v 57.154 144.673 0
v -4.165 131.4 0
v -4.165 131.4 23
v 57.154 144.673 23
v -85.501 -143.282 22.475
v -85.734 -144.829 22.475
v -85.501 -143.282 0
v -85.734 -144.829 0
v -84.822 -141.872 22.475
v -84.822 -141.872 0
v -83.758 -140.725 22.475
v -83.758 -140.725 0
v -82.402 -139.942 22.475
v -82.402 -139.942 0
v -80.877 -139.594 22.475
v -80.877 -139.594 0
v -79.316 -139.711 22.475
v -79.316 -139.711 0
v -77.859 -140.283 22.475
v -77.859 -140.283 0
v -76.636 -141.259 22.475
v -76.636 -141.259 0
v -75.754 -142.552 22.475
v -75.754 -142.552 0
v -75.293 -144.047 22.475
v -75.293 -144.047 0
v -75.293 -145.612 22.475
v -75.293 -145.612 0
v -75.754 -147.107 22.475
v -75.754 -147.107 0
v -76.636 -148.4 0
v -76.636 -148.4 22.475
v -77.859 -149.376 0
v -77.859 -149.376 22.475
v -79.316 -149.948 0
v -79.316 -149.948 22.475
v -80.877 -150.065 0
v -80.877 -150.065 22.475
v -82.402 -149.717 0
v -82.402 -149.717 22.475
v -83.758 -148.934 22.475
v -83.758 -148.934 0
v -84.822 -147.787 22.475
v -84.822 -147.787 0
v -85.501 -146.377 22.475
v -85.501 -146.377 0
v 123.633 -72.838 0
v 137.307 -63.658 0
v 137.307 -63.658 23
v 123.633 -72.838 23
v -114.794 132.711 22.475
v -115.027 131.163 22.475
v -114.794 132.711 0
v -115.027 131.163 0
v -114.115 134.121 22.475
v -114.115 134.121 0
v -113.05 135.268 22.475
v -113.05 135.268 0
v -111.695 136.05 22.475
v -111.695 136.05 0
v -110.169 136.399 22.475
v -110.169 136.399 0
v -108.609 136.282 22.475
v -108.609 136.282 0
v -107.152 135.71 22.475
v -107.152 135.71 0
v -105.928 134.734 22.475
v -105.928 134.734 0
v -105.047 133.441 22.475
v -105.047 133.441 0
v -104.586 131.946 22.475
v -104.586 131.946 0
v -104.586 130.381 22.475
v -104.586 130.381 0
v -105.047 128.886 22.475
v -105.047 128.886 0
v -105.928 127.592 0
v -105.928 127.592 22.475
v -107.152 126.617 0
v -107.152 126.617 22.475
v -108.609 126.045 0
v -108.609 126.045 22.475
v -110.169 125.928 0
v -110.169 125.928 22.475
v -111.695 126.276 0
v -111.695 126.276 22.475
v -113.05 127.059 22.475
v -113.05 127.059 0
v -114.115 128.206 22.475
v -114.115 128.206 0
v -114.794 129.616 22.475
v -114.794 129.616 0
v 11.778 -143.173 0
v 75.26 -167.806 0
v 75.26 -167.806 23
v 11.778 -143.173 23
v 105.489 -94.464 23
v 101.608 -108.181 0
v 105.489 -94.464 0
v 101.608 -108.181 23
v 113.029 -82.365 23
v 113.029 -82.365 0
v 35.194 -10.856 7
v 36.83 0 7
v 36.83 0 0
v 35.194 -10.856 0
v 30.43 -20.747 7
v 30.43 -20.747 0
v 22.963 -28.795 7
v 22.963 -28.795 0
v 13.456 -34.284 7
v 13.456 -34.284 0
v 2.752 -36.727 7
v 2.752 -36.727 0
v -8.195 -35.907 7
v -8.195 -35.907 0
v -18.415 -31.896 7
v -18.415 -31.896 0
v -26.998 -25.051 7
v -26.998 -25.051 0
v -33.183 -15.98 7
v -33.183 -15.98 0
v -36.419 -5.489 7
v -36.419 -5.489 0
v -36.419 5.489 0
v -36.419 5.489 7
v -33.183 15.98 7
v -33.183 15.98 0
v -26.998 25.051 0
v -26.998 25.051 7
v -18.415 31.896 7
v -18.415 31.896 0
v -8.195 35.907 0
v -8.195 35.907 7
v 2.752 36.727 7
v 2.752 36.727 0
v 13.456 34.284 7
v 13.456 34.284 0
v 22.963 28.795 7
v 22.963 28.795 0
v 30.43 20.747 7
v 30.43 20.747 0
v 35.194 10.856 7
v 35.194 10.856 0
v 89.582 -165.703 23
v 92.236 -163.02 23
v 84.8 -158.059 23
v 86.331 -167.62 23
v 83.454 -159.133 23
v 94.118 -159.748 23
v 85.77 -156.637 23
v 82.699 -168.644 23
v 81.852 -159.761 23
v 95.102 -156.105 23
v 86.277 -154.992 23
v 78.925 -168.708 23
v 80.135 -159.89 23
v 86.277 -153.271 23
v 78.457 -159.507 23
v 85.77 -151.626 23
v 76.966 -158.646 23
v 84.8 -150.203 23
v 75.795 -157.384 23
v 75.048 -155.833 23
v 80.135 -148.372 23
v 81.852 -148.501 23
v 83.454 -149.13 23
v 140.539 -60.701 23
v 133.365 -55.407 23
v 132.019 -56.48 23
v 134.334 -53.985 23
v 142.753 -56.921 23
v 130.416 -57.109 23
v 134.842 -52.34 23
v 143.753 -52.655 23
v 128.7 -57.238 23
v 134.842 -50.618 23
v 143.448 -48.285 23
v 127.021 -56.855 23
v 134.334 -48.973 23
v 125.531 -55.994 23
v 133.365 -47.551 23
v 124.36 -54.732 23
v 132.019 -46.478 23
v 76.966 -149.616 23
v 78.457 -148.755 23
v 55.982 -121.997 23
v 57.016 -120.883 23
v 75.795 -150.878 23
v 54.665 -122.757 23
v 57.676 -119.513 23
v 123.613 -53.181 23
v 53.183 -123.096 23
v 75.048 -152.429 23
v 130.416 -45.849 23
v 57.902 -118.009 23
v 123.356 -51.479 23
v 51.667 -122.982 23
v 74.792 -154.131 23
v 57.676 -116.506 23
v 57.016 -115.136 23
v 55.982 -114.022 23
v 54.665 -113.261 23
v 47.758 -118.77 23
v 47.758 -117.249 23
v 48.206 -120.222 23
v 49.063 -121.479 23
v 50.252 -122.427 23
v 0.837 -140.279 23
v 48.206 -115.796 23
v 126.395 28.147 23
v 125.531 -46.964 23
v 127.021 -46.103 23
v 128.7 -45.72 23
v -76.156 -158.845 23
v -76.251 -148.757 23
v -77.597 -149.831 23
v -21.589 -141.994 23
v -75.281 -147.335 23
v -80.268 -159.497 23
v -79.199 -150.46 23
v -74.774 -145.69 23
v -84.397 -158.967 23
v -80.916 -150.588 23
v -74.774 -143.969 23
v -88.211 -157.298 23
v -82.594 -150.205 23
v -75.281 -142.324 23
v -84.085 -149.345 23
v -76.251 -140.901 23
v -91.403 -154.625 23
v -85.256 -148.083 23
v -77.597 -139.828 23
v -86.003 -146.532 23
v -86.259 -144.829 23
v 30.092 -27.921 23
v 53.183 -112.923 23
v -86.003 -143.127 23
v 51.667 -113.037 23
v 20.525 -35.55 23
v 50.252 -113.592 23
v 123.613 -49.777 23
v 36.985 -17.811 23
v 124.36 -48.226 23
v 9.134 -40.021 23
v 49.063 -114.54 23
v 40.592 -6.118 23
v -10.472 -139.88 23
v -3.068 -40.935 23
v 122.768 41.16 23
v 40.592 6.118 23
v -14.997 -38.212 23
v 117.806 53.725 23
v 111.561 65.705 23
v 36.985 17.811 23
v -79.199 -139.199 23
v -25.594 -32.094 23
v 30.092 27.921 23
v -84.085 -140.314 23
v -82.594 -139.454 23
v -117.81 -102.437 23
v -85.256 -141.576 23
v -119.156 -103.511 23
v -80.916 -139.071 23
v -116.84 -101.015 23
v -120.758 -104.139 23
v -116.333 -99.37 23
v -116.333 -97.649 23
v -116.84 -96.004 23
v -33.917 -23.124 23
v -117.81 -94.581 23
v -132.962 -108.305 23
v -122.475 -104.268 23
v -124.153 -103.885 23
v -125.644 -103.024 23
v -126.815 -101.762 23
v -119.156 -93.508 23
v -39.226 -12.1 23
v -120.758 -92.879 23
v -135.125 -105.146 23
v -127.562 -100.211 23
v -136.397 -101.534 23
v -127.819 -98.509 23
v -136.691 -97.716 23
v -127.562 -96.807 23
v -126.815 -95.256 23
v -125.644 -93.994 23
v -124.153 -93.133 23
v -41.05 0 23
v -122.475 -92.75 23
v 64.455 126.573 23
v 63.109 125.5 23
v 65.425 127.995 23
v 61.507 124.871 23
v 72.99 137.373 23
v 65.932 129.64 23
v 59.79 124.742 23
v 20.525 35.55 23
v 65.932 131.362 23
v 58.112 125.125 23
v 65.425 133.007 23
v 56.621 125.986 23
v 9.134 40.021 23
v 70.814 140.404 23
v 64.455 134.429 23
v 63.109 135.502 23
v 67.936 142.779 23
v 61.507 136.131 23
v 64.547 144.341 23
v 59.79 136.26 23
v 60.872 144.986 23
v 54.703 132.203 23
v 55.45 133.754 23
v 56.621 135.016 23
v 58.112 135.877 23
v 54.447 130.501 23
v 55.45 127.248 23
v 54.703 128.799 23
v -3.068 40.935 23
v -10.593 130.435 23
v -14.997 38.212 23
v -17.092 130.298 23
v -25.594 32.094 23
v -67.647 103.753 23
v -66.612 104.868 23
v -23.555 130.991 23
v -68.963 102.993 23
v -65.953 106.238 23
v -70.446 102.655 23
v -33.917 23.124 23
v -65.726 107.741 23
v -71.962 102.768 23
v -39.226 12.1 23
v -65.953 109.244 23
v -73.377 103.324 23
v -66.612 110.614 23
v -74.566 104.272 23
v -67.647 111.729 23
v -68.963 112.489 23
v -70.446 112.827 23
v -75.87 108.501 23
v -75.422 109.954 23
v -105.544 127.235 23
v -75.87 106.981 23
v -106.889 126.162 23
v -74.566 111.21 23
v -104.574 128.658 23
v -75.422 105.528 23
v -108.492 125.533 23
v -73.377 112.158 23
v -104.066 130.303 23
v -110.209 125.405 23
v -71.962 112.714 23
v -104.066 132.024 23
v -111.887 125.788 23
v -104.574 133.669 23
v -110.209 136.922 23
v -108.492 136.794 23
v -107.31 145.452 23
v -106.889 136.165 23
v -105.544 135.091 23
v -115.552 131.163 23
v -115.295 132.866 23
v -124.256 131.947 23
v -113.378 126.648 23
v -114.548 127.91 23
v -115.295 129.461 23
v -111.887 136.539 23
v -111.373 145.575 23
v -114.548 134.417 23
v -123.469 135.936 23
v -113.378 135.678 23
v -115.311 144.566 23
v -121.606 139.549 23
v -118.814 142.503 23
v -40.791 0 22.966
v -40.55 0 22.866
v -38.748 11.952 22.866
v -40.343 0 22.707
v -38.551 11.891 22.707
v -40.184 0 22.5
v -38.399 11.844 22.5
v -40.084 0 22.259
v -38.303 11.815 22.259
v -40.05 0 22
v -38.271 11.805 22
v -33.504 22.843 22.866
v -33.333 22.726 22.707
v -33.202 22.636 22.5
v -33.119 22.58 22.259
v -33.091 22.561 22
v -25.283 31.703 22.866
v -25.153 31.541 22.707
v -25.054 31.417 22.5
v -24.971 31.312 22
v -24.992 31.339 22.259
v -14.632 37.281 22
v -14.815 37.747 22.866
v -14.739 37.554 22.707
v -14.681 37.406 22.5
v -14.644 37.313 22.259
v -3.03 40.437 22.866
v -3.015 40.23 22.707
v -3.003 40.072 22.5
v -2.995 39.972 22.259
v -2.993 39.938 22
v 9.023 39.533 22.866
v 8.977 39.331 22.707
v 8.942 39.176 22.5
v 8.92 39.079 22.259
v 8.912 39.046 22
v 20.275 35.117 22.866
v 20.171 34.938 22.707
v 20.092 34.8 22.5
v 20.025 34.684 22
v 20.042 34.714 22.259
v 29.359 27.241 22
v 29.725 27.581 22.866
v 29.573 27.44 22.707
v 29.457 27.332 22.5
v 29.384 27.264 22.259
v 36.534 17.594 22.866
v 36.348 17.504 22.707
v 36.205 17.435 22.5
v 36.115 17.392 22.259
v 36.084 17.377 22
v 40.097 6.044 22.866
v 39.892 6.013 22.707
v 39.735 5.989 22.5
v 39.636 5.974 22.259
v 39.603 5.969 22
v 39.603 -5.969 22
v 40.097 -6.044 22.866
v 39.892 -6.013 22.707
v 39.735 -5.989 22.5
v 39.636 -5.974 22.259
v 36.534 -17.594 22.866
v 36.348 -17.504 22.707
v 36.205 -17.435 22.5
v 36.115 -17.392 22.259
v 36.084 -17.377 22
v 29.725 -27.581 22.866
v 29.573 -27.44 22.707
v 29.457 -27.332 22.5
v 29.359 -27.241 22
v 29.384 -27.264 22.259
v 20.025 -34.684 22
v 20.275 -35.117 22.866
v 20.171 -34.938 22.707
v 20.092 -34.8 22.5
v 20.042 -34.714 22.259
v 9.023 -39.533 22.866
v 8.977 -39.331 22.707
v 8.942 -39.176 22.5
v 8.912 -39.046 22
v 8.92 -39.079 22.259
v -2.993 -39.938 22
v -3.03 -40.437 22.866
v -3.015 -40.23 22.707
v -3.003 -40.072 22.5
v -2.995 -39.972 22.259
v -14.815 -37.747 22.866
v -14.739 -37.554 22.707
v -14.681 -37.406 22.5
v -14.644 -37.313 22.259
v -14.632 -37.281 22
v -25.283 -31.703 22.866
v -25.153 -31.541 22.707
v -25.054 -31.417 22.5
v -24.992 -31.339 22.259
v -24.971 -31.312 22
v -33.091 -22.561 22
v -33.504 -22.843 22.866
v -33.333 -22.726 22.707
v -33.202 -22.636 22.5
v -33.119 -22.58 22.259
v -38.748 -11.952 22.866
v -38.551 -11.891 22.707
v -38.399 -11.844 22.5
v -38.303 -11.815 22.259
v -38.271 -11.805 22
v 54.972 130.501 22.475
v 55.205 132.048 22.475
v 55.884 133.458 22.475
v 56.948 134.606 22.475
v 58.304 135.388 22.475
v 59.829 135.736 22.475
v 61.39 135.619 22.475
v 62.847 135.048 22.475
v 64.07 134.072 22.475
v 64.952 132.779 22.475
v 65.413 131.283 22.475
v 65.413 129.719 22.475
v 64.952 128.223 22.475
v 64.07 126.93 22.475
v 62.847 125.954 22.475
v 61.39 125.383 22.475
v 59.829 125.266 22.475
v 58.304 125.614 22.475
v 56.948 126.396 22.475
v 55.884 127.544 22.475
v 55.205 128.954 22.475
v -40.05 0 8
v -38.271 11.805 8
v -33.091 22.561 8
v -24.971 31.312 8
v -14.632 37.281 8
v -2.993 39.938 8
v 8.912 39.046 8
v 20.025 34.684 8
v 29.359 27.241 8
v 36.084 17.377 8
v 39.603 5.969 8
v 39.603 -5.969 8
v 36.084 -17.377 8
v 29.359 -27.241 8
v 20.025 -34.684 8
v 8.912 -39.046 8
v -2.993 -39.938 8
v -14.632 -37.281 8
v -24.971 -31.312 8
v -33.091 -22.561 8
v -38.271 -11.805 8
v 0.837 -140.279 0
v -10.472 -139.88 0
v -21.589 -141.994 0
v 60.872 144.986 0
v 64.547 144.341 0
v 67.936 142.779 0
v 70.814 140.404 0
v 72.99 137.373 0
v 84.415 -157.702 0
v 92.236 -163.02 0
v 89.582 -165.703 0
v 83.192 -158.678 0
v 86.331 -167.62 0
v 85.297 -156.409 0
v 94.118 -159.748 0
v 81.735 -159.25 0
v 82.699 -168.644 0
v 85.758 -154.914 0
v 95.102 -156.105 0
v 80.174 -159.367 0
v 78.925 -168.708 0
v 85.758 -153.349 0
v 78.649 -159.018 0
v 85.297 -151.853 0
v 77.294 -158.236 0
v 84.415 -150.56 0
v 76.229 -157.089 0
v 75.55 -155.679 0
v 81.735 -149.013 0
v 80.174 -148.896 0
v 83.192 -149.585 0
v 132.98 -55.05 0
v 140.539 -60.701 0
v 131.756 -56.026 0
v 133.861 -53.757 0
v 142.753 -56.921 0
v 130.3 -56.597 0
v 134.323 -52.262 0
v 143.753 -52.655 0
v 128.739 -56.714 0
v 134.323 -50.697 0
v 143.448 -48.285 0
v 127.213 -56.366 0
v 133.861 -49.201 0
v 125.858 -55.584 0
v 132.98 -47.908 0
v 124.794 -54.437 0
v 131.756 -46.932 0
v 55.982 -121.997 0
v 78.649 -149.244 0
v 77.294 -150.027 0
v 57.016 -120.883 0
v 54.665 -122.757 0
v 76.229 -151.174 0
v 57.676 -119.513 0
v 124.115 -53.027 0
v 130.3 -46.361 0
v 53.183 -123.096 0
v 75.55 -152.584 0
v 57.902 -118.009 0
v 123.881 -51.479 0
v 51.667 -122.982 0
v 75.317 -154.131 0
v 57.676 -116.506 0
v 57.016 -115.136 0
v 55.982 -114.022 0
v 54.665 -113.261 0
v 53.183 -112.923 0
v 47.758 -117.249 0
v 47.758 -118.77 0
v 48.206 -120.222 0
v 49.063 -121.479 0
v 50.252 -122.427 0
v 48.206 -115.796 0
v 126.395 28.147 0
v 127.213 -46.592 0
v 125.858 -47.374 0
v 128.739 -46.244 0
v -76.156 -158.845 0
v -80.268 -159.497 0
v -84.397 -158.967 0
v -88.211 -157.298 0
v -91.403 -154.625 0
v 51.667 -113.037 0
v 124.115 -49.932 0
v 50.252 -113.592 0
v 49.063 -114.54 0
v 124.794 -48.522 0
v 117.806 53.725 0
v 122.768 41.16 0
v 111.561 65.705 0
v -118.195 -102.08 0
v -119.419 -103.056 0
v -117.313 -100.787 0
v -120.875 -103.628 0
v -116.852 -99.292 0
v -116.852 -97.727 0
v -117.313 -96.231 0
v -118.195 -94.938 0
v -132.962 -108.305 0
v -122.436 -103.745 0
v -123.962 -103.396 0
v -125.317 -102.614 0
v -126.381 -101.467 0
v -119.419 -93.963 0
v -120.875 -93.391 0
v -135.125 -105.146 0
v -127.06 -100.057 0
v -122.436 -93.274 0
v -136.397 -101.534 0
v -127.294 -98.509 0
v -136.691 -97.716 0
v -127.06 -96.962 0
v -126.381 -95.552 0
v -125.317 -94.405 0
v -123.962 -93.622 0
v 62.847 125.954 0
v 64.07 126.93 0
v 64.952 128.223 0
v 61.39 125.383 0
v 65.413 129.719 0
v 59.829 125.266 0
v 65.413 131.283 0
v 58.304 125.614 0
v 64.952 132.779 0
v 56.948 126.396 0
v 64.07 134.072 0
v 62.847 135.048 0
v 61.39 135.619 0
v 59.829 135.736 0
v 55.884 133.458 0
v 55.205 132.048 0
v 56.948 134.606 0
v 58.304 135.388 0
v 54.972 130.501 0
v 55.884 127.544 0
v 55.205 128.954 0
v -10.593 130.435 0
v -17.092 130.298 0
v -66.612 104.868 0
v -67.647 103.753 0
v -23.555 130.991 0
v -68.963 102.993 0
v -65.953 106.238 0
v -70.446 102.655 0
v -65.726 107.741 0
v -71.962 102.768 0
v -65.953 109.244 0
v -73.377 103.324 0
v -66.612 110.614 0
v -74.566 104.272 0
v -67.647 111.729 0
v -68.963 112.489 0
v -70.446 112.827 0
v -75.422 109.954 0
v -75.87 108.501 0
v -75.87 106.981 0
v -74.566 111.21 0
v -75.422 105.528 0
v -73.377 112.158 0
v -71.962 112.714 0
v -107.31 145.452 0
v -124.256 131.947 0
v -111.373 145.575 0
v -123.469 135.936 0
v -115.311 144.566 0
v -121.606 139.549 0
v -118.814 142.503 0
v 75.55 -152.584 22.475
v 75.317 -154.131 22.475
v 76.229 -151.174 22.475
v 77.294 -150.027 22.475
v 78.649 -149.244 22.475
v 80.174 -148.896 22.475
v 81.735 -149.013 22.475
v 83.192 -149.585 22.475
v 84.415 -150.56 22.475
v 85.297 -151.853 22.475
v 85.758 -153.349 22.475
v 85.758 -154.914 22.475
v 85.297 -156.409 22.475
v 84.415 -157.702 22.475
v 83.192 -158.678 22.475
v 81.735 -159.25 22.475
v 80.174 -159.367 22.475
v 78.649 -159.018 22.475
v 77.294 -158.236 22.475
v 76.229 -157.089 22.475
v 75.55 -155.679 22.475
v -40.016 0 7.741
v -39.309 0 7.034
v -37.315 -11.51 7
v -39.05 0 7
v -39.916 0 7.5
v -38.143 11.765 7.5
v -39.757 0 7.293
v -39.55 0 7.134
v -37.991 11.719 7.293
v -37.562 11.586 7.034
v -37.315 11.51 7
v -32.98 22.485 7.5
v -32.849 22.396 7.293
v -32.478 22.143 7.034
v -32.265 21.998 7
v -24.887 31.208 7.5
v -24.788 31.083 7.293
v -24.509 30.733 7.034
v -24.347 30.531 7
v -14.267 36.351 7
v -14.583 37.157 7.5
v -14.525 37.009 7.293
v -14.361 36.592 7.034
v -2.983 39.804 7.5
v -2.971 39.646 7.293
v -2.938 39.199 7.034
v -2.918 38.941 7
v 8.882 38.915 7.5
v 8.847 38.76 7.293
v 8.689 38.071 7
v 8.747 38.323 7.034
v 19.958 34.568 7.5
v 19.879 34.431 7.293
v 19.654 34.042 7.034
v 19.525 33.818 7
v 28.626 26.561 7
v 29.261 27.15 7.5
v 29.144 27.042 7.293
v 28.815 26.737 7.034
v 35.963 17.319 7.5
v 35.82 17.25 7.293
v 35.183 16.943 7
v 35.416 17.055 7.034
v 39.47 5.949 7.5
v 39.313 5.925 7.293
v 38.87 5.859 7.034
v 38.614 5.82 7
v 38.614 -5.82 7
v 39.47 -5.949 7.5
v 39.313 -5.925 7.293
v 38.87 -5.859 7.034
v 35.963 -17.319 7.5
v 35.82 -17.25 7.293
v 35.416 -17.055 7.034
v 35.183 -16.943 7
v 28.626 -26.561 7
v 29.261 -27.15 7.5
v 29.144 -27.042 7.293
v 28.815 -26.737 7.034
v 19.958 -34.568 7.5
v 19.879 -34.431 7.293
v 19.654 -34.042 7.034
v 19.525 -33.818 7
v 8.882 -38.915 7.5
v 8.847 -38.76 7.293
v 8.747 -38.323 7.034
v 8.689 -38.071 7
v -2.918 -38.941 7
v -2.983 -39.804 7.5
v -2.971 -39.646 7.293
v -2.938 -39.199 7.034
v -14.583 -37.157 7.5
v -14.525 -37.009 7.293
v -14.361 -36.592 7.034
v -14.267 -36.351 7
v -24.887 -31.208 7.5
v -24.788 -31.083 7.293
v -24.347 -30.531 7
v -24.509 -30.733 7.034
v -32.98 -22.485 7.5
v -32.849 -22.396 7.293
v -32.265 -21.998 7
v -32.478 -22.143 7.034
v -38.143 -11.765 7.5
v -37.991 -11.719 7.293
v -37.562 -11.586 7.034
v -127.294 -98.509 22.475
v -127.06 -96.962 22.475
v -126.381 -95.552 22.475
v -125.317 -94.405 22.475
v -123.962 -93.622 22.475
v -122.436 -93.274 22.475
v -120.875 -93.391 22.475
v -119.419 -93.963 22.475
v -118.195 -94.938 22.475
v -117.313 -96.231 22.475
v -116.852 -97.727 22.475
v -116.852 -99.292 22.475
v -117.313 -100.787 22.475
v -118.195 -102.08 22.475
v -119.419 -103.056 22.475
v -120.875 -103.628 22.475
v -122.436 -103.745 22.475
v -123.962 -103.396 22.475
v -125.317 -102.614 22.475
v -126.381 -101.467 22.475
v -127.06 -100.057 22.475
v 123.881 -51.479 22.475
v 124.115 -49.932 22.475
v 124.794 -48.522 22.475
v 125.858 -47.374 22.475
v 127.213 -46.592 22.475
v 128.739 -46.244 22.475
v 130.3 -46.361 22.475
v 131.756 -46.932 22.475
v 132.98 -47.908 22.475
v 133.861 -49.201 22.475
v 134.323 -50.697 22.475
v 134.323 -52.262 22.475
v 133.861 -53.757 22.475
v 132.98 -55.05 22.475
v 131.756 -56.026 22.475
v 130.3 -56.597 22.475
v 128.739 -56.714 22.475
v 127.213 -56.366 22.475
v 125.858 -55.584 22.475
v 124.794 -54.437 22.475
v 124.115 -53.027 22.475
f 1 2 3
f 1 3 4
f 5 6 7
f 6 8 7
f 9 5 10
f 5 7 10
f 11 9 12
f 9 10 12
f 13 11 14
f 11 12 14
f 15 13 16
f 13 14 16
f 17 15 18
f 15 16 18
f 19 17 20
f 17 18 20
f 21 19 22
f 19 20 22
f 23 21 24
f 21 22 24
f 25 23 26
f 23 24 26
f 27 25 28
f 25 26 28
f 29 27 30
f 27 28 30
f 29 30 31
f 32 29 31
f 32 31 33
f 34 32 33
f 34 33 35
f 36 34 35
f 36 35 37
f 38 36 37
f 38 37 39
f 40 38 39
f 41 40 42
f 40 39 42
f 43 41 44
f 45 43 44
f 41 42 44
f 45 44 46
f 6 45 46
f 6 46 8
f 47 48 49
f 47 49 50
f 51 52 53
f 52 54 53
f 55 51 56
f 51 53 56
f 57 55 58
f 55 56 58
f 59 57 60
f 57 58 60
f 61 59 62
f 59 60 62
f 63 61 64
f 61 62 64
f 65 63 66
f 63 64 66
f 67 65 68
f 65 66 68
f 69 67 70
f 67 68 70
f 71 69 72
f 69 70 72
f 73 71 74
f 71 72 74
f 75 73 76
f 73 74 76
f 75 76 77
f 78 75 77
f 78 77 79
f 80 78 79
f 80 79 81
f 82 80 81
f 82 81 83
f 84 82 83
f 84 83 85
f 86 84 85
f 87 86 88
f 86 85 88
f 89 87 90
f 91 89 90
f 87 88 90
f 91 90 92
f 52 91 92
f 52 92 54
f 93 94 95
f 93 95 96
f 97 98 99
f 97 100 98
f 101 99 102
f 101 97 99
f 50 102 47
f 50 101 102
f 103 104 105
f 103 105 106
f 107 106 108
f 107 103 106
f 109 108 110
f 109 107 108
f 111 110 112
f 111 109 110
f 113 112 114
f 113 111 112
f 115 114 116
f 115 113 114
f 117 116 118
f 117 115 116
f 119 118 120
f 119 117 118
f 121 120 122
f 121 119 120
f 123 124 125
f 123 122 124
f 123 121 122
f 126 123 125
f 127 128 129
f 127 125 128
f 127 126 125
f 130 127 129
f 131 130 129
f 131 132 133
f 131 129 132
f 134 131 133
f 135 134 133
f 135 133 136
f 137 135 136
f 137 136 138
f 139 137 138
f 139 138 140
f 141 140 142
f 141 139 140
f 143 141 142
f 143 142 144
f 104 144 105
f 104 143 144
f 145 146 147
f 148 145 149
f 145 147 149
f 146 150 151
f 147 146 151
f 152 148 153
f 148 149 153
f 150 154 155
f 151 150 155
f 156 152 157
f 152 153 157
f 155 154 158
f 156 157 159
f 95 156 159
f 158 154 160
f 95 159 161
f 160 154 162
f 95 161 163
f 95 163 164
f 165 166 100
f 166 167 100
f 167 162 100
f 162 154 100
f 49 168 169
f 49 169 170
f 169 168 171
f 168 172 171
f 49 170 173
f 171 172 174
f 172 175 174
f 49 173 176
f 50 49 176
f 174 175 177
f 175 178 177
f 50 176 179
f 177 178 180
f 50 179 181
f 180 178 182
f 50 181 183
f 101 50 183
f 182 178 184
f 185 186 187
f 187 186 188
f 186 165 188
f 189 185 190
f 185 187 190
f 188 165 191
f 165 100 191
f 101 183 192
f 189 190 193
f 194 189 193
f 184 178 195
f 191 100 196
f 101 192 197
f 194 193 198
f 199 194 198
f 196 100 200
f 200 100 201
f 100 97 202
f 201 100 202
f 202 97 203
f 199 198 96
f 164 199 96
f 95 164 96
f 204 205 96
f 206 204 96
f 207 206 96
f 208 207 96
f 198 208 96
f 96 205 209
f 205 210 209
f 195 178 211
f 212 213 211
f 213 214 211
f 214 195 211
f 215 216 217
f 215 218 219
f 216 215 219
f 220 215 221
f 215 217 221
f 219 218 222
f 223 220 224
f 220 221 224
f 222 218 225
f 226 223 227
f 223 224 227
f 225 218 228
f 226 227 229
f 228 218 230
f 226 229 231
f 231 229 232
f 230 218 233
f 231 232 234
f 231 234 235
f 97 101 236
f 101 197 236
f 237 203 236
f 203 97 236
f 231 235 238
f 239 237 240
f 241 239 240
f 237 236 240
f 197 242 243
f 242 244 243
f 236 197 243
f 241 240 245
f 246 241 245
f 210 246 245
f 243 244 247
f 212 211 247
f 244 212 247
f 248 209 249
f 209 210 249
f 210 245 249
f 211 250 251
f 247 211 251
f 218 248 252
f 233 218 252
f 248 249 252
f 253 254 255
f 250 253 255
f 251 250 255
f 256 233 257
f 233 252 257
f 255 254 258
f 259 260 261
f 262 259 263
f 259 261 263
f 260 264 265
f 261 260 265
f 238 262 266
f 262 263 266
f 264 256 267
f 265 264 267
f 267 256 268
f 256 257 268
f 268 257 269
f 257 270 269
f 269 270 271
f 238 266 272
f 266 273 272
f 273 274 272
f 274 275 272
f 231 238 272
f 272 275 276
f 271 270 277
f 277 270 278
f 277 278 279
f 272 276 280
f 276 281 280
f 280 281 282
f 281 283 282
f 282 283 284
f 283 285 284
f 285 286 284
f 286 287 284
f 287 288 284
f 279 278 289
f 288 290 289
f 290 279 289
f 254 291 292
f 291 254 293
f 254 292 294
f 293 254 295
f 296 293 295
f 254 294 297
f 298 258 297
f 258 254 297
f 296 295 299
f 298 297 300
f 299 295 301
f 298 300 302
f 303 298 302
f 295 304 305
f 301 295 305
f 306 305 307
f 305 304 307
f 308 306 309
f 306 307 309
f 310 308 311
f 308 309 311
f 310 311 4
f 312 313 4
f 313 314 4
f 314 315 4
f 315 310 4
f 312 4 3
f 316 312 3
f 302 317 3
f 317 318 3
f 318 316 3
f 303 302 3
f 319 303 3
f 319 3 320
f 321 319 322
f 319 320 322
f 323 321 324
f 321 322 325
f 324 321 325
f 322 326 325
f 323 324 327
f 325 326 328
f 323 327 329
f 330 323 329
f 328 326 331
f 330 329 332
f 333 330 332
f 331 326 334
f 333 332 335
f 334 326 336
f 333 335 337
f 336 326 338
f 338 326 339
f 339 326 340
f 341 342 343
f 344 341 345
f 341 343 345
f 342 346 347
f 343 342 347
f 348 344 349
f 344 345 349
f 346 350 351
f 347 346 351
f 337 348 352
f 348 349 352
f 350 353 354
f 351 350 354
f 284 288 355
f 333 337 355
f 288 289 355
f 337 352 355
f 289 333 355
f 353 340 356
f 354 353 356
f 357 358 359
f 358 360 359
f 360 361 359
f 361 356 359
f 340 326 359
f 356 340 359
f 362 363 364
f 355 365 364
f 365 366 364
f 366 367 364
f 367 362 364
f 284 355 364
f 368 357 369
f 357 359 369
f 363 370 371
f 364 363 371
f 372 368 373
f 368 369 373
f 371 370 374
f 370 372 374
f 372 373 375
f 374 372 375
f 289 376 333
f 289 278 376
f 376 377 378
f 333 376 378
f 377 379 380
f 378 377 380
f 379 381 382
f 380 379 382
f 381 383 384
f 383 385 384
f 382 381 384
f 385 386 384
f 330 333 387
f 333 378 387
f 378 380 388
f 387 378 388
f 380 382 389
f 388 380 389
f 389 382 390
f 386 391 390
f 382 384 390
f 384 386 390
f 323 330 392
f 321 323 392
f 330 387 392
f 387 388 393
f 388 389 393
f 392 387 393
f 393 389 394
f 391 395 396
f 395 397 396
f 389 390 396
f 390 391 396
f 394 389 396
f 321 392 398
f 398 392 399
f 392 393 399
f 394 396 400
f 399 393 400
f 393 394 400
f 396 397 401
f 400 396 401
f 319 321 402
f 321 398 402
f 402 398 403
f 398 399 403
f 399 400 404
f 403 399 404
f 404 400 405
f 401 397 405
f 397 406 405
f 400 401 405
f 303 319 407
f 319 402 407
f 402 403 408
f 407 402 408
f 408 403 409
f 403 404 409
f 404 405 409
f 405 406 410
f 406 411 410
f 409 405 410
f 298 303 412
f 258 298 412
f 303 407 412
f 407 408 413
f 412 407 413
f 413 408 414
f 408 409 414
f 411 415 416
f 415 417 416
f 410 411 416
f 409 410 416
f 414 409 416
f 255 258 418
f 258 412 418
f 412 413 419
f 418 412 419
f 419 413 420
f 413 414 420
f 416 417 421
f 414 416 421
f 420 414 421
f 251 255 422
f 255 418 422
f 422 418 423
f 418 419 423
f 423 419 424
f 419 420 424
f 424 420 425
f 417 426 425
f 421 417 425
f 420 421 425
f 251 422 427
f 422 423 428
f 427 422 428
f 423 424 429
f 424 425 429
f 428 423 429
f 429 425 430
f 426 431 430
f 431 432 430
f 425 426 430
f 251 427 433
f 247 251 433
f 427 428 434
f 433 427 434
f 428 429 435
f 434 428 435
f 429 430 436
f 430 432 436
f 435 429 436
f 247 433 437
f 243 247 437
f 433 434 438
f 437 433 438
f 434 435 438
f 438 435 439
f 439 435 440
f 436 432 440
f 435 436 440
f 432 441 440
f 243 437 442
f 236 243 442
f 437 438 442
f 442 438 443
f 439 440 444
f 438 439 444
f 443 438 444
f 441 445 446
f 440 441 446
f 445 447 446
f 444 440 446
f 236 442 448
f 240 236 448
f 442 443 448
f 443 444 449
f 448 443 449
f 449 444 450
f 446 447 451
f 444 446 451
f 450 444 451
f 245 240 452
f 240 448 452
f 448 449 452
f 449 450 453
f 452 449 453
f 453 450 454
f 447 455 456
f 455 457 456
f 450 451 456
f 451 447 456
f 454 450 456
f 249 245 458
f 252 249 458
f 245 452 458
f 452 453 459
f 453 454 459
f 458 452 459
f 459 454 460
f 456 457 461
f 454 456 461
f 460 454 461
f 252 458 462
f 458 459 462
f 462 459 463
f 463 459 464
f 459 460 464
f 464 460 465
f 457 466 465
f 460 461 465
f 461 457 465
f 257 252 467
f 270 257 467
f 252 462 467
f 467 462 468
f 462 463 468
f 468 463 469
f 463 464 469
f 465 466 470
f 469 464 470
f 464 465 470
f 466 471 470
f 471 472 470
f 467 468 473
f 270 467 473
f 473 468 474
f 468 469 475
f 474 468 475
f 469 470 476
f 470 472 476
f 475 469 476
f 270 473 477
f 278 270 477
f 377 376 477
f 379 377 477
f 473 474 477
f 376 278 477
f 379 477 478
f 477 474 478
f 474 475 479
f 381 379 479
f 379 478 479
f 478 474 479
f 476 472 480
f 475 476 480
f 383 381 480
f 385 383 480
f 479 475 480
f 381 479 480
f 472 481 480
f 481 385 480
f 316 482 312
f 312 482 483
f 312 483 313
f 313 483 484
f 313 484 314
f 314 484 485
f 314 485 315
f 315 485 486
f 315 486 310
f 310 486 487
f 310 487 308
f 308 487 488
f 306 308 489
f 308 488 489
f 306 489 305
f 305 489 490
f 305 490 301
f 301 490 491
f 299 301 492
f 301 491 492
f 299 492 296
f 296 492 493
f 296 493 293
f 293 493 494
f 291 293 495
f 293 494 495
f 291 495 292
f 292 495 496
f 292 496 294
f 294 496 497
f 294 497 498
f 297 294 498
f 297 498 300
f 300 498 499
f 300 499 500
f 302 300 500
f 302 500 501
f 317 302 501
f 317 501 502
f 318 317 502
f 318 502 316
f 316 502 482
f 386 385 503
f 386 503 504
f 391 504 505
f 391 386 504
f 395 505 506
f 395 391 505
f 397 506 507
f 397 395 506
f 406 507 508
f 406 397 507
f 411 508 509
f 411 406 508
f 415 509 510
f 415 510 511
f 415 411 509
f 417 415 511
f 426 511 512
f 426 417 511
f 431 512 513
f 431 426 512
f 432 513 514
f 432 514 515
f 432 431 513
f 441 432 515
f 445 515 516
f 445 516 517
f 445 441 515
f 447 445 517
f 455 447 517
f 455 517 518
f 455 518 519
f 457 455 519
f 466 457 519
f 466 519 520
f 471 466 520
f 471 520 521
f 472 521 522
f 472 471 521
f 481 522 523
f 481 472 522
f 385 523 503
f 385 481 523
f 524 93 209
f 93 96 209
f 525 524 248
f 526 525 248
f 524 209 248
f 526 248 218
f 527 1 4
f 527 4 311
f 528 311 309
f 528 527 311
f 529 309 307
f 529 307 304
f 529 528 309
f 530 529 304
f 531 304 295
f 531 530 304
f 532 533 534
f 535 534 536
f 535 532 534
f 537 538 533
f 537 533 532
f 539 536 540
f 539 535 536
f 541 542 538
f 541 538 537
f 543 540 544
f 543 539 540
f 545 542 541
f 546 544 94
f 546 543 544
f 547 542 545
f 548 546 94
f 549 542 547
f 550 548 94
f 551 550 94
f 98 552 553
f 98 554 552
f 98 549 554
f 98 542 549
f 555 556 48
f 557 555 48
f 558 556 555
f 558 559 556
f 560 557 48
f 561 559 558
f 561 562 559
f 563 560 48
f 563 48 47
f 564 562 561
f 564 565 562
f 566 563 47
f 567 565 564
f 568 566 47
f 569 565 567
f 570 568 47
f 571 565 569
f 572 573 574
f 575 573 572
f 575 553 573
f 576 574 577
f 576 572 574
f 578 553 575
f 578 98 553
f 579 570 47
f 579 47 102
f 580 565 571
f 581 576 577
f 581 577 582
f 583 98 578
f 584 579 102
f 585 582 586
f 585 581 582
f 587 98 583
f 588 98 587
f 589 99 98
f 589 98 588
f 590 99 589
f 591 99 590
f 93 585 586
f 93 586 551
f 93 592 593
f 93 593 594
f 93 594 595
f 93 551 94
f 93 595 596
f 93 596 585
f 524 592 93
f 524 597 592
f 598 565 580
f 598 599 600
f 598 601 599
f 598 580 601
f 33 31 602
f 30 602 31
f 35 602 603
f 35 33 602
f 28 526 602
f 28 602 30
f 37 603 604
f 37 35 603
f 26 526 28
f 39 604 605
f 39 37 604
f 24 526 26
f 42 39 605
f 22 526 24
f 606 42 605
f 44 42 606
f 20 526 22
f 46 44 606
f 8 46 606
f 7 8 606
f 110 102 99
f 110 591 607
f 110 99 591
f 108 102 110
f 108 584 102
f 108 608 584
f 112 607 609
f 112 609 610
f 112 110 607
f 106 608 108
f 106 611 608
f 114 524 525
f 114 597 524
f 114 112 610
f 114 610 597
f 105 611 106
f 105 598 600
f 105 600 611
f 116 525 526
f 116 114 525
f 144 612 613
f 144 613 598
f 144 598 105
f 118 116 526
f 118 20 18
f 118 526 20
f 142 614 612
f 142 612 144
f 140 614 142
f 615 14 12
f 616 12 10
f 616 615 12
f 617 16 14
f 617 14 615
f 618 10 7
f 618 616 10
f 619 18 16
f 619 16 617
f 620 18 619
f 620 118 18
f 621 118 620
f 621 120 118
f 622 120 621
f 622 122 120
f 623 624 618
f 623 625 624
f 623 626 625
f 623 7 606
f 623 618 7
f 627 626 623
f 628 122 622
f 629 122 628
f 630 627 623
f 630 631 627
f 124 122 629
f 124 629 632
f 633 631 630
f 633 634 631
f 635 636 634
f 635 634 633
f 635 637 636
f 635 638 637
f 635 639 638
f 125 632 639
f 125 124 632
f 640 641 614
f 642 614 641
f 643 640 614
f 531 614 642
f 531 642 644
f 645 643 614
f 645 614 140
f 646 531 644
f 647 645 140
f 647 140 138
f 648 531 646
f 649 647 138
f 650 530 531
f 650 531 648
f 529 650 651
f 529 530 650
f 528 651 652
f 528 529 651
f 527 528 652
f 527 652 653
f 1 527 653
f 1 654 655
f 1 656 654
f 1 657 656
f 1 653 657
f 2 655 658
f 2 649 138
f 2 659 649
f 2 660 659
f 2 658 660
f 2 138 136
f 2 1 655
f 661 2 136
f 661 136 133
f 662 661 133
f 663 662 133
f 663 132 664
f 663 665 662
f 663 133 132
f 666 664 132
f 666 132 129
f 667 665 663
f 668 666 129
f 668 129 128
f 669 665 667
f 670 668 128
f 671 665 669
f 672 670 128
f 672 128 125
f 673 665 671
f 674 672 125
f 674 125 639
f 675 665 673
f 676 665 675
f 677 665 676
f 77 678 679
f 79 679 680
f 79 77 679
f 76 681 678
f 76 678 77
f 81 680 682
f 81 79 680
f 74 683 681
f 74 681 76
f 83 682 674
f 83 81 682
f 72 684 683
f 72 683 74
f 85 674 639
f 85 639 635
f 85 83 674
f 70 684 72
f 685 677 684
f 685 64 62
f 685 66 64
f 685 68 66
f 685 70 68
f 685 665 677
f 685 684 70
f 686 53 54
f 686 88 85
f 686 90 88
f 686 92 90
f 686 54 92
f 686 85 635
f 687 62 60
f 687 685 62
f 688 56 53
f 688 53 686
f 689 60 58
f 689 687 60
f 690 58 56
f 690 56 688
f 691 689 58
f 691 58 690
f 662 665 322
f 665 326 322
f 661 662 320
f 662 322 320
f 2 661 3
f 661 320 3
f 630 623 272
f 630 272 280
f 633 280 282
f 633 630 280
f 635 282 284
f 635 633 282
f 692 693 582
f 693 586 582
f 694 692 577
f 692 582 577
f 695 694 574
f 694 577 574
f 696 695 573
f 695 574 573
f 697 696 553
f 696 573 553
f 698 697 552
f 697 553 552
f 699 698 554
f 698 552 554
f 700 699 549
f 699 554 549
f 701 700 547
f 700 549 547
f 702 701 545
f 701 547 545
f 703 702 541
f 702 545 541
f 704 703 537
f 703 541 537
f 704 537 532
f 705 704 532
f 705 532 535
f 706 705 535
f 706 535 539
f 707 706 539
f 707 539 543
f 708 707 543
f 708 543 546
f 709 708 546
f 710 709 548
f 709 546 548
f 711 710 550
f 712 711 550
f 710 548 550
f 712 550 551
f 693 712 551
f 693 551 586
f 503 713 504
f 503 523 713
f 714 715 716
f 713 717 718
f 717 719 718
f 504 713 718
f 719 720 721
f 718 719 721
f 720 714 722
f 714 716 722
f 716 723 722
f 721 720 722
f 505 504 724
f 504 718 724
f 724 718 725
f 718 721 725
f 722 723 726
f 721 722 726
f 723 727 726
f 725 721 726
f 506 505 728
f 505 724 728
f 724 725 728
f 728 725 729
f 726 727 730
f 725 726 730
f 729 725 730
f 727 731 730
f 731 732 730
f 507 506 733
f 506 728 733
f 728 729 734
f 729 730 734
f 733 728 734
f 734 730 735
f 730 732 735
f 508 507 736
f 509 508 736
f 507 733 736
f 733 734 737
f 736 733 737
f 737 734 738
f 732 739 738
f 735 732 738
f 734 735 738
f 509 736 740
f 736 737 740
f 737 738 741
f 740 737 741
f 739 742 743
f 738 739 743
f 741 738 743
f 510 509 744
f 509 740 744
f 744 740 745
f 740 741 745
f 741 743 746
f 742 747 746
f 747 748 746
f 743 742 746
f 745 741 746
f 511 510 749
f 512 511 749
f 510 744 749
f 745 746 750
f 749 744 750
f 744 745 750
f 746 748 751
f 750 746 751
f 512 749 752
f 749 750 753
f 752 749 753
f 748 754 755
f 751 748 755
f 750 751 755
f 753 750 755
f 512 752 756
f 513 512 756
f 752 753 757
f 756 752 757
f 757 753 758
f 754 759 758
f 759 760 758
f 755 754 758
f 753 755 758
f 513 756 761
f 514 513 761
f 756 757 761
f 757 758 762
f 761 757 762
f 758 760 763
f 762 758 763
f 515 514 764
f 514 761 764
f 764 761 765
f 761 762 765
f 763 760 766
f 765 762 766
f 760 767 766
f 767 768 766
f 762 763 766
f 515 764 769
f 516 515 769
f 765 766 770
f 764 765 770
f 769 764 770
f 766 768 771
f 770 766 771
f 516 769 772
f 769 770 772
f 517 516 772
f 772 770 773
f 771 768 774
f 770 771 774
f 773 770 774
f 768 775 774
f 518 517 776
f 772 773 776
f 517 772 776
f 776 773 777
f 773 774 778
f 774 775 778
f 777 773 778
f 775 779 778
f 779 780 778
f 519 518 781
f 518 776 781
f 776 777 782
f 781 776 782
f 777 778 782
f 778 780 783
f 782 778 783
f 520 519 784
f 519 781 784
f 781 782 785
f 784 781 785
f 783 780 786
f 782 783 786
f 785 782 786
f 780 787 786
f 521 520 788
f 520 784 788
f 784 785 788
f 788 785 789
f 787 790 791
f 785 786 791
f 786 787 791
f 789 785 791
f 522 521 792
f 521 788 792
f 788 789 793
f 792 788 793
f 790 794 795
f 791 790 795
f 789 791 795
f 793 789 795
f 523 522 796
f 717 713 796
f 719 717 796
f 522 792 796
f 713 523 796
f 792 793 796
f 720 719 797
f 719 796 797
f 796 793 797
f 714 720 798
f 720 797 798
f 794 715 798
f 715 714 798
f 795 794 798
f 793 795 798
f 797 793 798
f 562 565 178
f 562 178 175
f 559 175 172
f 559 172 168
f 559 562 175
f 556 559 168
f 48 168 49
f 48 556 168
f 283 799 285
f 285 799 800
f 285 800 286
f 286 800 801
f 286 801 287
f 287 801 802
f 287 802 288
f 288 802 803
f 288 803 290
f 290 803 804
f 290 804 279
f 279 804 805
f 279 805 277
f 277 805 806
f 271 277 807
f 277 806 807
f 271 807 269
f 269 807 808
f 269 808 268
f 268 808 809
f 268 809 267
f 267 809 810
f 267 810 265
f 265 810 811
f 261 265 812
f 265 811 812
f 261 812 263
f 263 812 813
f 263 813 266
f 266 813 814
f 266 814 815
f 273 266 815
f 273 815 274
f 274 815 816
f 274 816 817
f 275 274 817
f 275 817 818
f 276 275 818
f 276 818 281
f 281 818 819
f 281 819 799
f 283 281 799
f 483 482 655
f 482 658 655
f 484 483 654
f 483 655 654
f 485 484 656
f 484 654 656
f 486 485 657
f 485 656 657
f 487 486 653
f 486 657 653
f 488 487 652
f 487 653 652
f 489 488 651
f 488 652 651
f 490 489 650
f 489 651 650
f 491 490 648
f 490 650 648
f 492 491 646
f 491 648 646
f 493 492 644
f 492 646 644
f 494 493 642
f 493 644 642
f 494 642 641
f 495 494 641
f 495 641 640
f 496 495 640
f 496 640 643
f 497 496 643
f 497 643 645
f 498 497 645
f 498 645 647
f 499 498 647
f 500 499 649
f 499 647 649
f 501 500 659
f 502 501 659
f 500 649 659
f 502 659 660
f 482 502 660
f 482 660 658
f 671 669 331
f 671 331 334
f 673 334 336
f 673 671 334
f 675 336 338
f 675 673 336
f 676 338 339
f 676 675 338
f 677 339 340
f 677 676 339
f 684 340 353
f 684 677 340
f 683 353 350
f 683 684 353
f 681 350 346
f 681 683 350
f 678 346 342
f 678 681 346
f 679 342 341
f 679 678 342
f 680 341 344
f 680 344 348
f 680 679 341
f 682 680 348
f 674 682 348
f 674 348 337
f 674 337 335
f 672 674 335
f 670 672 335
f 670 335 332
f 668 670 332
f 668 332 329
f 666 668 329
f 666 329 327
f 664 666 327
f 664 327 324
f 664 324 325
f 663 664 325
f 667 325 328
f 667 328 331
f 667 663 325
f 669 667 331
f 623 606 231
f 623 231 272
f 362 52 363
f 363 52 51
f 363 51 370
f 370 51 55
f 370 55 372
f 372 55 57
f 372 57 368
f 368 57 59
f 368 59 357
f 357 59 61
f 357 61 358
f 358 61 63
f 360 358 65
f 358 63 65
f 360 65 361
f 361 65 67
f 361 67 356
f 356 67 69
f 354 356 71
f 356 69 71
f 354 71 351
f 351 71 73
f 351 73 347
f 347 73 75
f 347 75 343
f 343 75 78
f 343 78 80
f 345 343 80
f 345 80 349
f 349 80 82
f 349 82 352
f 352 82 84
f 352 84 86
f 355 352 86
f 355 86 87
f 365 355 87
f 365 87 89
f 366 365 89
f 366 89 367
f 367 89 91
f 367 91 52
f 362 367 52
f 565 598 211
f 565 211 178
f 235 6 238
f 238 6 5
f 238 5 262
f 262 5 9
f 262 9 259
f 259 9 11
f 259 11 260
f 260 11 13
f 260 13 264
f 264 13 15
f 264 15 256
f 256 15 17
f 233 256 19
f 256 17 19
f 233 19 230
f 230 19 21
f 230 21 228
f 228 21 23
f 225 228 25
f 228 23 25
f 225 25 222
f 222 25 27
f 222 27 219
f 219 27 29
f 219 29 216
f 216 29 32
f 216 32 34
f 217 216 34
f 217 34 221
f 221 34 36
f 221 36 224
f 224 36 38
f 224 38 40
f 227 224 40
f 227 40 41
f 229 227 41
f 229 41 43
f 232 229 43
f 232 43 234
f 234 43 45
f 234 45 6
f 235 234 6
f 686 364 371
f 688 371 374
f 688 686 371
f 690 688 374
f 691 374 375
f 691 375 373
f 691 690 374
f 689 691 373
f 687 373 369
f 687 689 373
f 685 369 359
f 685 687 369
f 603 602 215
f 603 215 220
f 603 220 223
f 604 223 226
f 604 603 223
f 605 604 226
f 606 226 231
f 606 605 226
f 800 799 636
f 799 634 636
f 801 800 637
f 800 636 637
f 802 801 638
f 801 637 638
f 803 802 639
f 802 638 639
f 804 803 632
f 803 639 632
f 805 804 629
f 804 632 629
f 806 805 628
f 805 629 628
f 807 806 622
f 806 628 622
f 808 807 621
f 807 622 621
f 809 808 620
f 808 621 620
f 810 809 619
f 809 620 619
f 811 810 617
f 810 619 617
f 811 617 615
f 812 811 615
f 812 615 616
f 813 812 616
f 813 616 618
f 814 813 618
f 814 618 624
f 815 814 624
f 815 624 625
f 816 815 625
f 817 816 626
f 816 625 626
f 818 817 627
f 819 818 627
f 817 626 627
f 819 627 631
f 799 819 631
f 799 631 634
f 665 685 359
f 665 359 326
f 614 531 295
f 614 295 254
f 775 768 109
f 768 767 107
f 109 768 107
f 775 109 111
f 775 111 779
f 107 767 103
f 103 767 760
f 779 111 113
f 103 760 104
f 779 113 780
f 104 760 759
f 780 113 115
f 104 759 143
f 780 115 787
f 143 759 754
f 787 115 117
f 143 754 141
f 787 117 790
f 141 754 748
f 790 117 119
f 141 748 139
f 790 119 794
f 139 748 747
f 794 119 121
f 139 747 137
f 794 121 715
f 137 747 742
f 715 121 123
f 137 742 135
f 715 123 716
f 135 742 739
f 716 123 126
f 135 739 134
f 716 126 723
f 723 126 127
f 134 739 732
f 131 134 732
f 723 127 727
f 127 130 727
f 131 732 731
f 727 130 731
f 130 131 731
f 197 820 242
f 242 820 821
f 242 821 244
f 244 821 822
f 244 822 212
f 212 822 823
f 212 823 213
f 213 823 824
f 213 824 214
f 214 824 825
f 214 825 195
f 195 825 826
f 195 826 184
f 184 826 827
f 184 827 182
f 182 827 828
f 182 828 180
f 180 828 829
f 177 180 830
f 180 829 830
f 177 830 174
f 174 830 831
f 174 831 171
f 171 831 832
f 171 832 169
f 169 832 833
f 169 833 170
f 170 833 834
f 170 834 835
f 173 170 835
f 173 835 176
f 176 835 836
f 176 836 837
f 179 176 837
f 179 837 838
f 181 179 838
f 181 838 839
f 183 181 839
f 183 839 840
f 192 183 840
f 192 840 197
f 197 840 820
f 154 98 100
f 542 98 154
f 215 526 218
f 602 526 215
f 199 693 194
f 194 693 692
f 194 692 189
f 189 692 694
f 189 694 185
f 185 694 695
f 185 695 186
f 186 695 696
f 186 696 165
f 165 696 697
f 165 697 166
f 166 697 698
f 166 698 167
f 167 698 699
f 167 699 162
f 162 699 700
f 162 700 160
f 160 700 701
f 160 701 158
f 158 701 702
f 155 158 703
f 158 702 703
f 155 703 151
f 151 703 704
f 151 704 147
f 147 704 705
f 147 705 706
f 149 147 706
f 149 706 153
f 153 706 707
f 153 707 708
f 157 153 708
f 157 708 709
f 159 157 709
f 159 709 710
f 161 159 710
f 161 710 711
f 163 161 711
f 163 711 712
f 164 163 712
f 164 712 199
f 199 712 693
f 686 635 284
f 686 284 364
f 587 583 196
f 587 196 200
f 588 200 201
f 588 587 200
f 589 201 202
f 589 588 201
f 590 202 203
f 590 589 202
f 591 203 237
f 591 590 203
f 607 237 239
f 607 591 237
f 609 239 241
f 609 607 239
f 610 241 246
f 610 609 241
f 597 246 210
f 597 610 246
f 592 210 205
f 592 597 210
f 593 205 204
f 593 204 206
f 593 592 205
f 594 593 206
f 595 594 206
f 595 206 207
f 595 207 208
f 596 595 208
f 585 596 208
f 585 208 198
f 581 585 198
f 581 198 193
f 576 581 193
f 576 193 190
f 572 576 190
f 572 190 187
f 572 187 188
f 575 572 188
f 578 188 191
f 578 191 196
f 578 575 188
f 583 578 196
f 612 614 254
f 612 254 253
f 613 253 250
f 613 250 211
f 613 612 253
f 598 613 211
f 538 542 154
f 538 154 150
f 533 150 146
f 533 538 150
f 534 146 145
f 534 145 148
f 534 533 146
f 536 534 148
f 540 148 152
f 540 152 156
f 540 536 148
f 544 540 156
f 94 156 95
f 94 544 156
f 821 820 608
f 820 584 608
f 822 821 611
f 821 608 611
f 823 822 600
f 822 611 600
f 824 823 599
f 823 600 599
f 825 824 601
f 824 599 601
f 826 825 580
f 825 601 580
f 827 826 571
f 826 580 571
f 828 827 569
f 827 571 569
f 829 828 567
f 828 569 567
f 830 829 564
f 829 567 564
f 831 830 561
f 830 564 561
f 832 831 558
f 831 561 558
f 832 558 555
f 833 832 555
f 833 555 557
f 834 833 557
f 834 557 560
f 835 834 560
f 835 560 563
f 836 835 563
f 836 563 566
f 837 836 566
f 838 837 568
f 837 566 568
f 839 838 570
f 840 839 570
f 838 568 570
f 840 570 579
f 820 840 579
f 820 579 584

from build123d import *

# Parameters (mm, degrees)
SKETCH1_R                       = 1.5
SKETCH1_R_2                     = 5.100618704
BOSS_EXTRUDE1_DEPTH             = 23
FILLET2_R                       = 50.8
SKETCH2_R                       = 40.05
CUT_EXTRUDE1_DEPTH              = 16
SKETCH5_R                       = 36.83
CUT_EXTRUDE2_DEPTH              = 25.4
FILLET5_R                       = 1
FILLET6_R                       = 1
M10_CLEARANCE_HOLE4_D           = 10.5
M10_CLEARANCE_HOLE4_CSINK_D     = 11.55
M10_CLEARANCE_HOLE4_CSINK_ANGLE = 90


with BuildPart() as part:
    # Sketch1 → Boss-Extrude1 (new body)
    with BuildSketch(Plane.XY):
        with BuildLine():
            Line((75.260281277, -167.806485638), (-4.700564051, -136.778396463))
            Line((-4.700564051, -136.778396463), (-76.156211748, -158.845068243))
            ThreePointArc((-76.156211748, -158.845068243), (-84.397046653, -158.966738807), (-91.402736844, -154.625486844))
            Line((-91.402736844, -154.625486844), (-132.961820606, -108.305285312))
            ThreePointArc((-132.961820606, -108.305285312), (-135.879409932, -103.381593327), (-136.690789762, -97.716195457))
            Line((-136.690789762, -97.716195457), (-124.255747511, 131.9473438))
            ThreePointArc((-124.255747511, 131.9473438), (-118.813814635, 142.502935513), (-107.309980144, 145.451993305))
            Line((-107.309980144, 145.451993305), (-13.820265411, 129.310675557))
            Line((-13.820265411, 129.310675557), (57.154321142, 144.67282316))
            ThreePointArc((57.154321142, 144.67282316), (66.292090414, 143.669172059), (72.989999045, 137.372810987))
            Line((72.989999045, 137.372810987), (111.561324809, 65.705034096))
            ThreePointArc((111.561324809, 65.705034096), (120.450704592, 47.507478462), (126.394675624, 28.146659461))
            Line((126.394675624, 28.146659461), (143.447960396, -48.284765241))
            ThreePointArc((143.447960396, -48.284765241), (142.753389973, -56.92050988), (137.306991007, -63.658109738))
            Line((137.306991007, -63.658109738), (104.679233021, -85.560920301))
            Line((104.679233021, -85.560920301), (95.102188007, -156.104602115))
            ThreePointArc((95.102188007, -156.104602115), (88.018421694, -166.766325043), (75.260281277, -167.806485638))
        make_face()
        with Locations((-109.776955272, 131.163395273)):
            Circle(SKETCH1_R, mode=Mode.SUBTRACT)
        with Locations((-70.826725389, 107.740981135)):
            Circle(SKETCH1_R_2, mode=Mode.SUBTRACT)
        with Locations((-122.043542394, -98.509264921)):
            Circle(SKETCH1_R, mode=Mode.SUBTRACT)
        with Locations((-80.484458632, -144.829466453)):
            Circle(SKETCH1_R, mode=Mode.SUBTRACT)
        with Locations((52.801836898, -118.009411705)):
            Circle(SKETCH1_R_2, mode=Mode.SUBTRACT)
        with Locations((80.566824551, -154.131274008)):
            Circle(SKETCH1_R, mode=Mode.SUBTRACT)
        with Locations((129.131286757, -51.479083724)):
            Circle(SKETCH1_R, mode=Mode.SUBTRACT)
        with Locations((60.221754192, 130.500990023)):
            Circle(SKETCH1_R, mode=Mode.SUBTRACT)
    extrude(amount=BOSS_EXTRUDE1_DEPTH)

    # Fillet2
    fillet2_edges = [part.edges().sort_by_distance(p)[0] for p in [
        (104.679233021, -85.560920301, 11.5),
        (-4.700564051, -136.778396463, 11.5),
        (-13.820265411, 129.310675557, 11.5),
    ]]
    fillet(fillet2_edges, radius=FILLET2_R)

    # Sketch2 → Cut-Extrude1 (cut)
    with BuildSketch(Plane(origin=(0, 0, 23), x_dir=(-1, 0, 0), z_dir=(0, 0, -1))):
        Circle(SKETCH2_R)
    extrude(amount=CUT_EXTRUDE1_DEPTH, mode=Mode.SUBTRACT)

    # Sketch5 → Cut-Extrude2 (cut)
    with BuildSketch(Plane(origin=(0, 0, 23), x_dir=(-1, 0, 0), z_dir=(0, 0, -1))):
        with Locations(Location((0, 0, 0), (0, 0, 180))):
            Circle(SKETCH5_R)
    extrude(amount=CUT_EXTRUDE2_DEPTH, mode=Mode.SUBTRACT)

    # Fillet5
    fillet5_edges = [part.edges().sort_by_distance(p)[0] for p in [
        (40.05, 0, 23),
    ]]
    fillet(fillet5_edges, radius=FILLET5_R)

    # Fillet6
    fillet6_edges = [part.edges().sort_by_distance(p)[0] for p in [
        (40.05, 0, 7),
    ]]
    fillet(fillet6_edges, radius=FILLET6_R)

    # M10 Clearance Hole4 (through all)
    with Locations(Plane.XY.offset(23)):
        with Locations((60.221754192, 130.500990023), (-109.776955272, 131.163395273), (129.131286757, -51.479083724), (80.566824551, -154.131274008), (-80.484458632, -144.829466453), (-122.043542394, -98.509264921)):
            CounterSinkHole(M10_CLEARANCE_HOLE4_D / 2, M10_CLEARANCE_HOLE4_CSINK_D / 2, counter_sink_angle=M10_CLEARANCE_HOLE4_CSINK_ANGLE)


solid = part.part
